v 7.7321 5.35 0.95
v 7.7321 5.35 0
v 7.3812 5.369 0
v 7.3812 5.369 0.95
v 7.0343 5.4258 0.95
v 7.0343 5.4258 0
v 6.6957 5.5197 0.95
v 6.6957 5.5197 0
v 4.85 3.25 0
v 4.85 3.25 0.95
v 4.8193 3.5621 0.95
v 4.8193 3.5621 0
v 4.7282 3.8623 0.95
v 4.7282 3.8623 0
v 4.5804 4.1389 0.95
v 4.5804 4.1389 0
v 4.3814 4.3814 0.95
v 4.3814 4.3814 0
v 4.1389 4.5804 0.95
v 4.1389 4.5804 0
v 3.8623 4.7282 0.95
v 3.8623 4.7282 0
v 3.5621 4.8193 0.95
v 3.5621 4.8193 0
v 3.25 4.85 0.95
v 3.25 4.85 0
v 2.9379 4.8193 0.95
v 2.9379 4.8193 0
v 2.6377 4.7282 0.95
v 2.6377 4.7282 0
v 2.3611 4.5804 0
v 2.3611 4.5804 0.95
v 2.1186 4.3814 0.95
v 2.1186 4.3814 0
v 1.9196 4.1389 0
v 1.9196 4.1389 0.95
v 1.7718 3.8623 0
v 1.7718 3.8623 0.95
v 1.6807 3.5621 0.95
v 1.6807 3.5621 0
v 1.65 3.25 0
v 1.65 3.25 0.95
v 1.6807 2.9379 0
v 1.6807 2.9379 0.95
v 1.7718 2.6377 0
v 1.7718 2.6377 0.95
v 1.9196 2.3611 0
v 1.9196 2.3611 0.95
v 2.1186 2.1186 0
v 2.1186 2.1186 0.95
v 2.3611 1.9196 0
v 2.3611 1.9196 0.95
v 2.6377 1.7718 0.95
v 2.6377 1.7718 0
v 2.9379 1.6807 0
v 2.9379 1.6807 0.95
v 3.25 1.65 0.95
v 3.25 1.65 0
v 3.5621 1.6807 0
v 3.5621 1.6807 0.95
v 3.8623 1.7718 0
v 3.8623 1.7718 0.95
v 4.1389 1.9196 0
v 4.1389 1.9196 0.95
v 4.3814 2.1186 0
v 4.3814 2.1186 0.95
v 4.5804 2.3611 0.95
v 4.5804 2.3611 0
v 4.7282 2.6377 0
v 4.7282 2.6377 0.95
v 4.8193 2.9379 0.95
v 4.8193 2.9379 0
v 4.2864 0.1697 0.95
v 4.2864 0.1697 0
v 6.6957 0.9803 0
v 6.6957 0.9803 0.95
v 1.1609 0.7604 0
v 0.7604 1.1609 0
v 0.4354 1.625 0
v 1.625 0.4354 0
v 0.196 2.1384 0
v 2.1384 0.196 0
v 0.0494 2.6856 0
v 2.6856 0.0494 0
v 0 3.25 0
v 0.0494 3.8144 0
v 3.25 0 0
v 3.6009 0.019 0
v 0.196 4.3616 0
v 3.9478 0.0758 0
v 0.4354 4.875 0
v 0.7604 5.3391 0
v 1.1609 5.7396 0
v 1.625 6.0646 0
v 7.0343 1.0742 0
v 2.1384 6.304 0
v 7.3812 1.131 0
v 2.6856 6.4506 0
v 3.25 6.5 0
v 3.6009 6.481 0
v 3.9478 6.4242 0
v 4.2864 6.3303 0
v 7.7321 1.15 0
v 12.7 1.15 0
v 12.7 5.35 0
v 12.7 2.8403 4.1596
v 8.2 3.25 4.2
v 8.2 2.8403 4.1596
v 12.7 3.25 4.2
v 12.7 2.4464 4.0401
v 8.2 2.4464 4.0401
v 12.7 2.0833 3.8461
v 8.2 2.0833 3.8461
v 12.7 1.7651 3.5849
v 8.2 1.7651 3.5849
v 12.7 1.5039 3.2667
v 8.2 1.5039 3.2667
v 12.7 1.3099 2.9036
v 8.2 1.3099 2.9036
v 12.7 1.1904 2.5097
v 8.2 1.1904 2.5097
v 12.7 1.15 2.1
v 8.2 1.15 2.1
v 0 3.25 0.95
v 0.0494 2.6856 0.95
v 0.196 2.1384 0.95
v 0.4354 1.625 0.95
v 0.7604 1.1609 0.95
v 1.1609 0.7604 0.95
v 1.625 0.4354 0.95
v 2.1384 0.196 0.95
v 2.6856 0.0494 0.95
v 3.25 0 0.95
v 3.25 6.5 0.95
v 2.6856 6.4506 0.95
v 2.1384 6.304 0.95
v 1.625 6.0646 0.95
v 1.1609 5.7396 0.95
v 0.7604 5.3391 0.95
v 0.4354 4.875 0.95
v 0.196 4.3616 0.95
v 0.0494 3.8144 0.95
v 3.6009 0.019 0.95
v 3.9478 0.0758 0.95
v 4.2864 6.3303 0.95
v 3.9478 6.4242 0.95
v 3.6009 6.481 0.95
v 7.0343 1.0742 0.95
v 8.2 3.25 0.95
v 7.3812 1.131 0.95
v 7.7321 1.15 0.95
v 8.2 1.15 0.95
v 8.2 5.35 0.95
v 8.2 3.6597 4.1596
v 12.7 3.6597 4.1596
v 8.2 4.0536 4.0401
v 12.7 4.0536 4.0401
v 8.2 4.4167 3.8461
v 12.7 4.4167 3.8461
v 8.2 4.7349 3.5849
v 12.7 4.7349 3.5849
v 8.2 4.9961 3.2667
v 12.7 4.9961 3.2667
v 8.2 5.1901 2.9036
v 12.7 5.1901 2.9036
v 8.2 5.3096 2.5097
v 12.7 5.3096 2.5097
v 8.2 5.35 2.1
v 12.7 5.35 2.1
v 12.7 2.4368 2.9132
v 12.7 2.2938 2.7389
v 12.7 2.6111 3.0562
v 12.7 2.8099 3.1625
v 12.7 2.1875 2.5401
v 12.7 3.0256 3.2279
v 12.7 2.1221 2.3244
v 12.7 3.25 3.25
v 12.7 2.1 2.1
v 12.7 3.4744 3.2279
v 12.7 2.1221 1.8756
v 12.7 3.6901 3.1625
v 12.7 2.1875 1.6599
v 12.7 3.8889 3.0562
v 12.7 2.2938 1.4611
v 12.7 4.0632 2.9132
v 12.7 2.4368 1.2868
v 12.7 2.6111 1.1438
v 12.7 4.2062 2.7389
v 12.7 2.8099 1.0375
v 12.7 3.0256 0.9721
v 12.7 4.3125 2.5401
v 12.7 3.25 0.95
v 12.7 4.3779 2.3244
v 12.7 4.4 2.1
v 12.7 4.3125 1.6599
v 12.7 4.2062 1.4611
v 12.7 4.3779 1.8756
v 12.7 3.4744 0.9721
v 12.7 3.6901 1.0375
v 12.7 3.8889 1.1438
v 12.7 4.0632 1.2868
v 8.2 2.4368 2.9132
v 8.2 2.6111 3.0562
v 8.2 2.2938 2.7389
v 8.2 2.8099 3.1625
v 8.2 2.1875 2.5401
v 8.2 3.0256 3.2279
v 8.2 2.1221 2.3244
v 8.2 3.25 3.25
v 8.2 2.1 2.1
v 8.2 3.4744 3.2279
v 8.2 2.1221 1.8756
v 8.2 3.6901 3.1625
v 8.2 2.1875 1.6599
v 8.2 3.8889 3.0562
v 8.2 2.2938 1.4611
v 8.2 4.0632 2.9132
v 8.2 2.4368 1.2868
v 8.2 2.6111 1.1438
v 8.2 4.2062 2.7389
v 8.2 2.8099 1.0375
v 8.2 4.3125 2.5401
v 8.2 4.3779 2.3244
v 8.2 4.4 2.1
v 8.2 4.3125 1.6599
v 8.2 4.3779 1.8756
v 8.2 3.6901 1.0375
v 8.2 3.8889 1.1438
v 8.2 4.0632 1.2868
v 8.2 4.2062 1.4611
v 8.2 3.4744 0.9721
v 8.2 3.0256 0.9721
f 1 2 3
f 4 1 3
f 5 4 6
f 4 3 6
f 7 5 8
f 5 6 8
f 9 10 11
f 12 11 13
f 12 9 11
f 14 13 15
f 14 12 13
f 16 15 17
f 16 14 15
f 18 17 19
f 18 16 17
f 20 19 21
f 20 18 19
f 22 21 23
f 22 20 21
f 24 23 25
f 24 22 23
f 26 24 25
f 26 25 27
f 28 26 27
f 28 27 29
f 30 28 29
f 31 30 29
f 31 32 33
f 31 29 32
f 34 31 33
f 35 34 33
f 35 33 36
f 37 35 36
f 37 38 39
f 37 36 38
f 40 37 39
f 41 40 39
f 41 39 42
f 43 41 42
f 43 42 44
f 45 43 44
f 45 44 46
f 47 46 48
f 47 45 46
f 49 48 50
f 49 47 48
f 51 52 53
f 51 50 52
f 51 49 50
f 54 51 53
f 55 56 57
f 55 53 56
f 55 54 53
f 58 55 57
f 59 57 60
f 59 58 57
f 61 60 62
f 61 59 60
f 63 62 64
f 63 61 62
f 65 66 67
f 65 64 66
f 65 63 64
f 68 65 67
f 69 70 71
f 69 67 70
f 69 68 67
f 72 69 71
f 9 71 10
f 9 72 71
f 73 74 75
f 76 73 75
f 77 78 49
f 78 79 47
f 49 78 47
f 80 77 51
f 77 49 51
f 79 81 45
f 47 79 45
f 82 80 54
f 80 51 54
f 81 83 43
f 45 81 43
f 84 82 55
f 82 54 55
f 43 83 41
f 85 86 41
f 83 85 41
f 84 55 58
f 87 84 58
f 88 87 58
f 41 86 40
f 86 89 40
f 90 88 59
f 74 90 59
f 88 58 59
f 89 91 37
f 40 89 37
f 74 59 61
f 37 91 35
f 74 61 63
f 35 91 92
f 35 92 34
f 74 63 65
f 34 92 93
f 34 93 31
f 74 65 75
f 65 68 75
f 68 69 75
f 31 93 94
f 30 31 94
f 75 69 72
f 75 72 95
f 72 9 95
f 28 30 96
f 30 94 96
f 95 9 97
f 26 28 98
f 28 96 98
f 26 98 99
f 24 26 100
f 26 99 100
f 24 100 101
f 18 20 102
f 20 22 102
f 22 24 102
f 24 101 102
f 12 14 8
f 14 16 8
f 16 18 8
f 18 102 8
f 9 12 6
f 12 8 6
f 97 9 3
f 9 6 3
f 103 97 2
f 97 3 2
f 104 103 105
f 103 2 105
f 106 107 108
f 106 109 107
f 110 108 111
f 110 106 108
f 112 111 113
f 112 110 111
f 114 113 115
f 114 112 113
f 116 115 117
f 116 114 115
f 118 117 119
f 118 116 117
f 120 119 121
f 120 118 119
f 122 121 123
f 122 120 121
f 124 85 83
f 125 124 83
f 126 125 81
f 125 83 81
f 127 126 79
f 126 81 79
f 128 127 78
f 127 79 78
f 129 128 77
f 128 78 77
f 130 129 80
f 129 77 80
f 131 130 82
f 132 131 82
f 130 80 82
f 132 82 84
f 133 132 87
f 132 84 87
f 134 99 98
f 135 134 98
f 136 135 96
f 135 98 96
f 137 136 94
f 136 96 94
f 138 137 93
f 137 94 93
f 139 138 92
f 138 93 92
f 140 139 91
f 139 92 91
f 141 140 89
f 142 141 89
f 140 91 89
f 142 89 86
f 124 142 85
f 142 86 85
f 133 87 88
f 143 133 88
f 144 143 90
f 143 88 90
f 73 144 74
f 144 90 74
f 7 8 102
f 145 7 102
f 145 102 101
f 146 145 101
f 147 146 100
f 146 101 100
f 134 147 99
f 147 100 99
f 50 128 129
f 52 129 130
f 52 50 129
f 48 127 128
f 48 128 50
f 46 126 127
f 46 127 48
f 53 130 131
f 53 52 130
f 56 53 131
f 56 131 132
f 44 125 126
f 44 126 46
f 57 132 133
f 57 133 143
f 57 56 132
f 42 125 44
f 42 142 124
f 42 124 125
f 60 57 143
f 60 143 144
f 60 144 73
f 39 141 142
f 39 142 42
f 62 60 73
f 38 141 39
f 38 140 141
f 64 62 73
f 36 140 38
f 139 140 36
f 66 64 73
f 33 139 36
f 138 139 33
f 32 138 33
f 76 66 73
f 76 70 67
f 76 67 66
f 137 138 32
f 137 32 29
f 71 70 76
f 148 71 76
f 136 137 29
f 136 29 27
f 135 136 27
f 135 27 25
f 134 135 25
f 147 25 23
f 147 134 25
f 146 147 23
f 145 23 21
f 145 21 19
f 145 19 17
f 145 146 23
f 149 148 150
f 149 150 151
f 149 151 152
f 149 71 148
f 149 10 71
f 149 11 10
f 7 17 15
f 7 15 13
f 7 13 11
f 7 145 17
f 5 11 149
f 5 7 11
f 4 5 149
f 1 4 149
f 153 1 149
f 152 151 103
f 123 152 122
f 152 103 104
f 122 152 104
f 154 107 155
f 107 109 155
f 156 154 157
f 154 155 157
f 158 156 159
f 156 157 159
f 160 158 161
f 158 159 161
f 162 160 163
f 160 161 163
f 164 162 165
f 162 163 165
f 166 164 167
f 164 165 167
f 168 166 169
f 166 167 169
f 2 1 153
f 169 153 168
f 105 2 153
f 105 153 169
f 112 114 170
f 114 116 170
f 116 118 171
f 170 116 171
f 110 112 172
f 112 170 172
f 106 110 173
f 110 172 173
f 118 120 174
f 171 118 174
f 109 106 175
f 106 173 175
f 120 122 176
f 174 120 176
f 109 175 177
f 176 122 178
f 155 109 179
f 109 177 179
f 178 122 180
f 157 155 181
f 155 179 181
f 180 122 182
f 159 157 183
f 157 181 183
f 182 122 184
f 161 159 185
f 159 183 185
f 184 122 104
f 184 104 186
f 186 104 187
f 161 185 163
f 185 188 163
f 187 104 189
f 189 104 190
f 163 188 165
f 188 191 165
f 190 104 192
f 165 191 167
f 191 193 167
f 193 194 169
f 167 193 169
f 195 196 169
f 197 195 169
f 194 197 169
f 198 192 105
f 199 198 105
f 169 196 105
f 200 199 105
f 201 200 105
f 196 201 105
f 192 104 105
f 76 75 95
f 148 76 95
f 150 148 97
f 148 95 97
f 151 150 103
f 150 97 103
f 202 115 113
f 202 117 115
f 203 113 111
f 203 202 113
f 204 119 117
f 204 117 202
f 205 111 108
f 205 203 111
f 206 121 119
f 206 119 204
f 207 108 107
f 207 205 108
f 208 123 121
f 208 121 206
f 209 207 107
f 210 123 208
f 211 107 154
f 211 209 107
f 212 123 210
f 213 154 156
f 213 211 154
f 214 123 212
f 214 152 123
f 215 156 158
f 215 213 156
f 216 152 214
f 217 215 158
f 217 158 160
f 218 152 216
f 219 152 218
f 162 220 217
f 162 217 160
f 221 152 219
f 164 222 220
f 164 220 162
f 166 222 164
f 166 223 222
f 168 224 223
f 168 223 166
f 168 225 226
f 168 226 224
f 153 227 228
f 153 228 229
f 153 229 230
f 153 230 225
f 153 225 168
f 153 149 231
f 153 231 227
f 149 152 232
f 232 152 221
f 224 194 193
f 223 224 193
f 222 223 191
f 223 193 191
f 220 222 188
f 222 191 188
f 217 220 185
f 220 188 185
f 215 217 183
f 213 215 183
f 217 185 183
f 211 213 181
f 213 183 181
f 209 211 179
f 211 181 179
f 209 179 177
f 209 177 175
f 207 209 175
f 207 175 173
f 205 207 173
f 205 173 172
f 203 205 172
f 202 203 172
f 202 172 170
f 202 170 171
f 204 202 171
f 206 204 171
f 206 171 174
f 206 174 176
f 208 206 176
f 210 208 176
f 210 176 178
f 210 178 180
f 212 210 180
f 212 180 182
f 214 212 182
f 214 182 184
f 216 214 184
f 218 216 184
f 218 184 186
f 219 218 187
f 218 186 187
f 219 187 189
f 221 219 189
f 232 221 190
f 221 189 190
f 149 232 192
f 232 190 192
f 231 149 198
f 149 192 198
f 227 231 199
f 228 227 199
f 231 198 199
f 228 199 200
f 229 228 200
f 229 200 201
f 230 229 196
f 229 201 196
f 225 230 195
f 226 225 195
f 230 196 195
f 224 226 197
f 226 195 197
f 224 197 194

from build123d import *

# Parameters (mm, degrees)
F0_R     = 1.6
F1_DEPTH = 0.95
F2_W     = 4.5
F2_H     = 4.2
F3_DEPTH = 3.25
F4_R     = 2.09999
F5_R     = 1.15
F6_DEPTH = 25


# Not quite as in the source:
# - a fillet or chamfer is up to 0.001 mm smaller than in the source, because OpenCascade refuses the exact size


with BuildPart() as f1:
    # F0 (on Top) → F1 (new body)
    with BuildSketch(Plane.XY):
        with BuildLine():
            Line((7.7320977576, 1.15), (12.7, 1.15))
            Line((12.7, 1.15), (12.7, 5.35))
            Line((12.7, 5.35), (8.2, 5.35))
            Line((8.2, 5.35), (7.7320977576, 5.35))
            ThreePointArc((7.7320977576, 5.35), (7.2069912058, 5.3927015871), (6.6956833513, 5.5196842405))
            Line((6.6956833513, 5.5196842405), (4.2864144063, 6.3303157595))
            ThreePointArc((4.2864144063, 6.3303157595), (3.7751065518, 6.4572984129), (3.25, 6.5))
            ThreePointArc((3.25, 6.5), (0.9519029611, 5.5480970389), (0, 3.25))
            ThreePointArc((0, 3.25), (0.9519029611, 0.9519029611), (3.25, 0))
            ThreePointArc((3.25, 0), (3.7751065518, 0.0427015871), (4.2864144063, 0.1696842405))
            Line((4.2864144063, 0.1696842405), (6.6956833513, 0.9803157595))
            ThreePointArc((6.6956833513, 0.9803157595), (7.2069912058, 1.1072984129), (7.7320977576, 1.15))
        make_face()
        with Locations((3.25, 3.25)):
            Circle(F0_R, mode=Mode.SUBTRACT)
    extrude(amount=F1_DEPTH)

    # F2 (on face) → F3 (join)
    with BuildSketch(Plane.XY.offset(0.95)):
        with Locations((10.45, 3.25)):
            Rectangle(F2_W, F2_H)
    extrude(amount=F3_DEPTH)

    # F4 (radius 2.1 in the source; OpenCascade refuses exactly that, so slightly less here)
    f4_edges = [f1.edges().sort_by_distance(p)[0] for p in [
        (10.45, 5.35, 4.2),
        (10.45, 1.15, 4.2),
    ]]
    fillet(f4_edges, radius=F4_R)

    # F5 (on face) → F6 (cut)
    with BuildSketch(Plane.YZ.offset(12.7)):
        with Locations((3.25, 2.1)):
            Circle(F5_R)
    extrude(amount=-F6_DEPTH, mode=Mode.SUBTRACT)


solid = f1.part
